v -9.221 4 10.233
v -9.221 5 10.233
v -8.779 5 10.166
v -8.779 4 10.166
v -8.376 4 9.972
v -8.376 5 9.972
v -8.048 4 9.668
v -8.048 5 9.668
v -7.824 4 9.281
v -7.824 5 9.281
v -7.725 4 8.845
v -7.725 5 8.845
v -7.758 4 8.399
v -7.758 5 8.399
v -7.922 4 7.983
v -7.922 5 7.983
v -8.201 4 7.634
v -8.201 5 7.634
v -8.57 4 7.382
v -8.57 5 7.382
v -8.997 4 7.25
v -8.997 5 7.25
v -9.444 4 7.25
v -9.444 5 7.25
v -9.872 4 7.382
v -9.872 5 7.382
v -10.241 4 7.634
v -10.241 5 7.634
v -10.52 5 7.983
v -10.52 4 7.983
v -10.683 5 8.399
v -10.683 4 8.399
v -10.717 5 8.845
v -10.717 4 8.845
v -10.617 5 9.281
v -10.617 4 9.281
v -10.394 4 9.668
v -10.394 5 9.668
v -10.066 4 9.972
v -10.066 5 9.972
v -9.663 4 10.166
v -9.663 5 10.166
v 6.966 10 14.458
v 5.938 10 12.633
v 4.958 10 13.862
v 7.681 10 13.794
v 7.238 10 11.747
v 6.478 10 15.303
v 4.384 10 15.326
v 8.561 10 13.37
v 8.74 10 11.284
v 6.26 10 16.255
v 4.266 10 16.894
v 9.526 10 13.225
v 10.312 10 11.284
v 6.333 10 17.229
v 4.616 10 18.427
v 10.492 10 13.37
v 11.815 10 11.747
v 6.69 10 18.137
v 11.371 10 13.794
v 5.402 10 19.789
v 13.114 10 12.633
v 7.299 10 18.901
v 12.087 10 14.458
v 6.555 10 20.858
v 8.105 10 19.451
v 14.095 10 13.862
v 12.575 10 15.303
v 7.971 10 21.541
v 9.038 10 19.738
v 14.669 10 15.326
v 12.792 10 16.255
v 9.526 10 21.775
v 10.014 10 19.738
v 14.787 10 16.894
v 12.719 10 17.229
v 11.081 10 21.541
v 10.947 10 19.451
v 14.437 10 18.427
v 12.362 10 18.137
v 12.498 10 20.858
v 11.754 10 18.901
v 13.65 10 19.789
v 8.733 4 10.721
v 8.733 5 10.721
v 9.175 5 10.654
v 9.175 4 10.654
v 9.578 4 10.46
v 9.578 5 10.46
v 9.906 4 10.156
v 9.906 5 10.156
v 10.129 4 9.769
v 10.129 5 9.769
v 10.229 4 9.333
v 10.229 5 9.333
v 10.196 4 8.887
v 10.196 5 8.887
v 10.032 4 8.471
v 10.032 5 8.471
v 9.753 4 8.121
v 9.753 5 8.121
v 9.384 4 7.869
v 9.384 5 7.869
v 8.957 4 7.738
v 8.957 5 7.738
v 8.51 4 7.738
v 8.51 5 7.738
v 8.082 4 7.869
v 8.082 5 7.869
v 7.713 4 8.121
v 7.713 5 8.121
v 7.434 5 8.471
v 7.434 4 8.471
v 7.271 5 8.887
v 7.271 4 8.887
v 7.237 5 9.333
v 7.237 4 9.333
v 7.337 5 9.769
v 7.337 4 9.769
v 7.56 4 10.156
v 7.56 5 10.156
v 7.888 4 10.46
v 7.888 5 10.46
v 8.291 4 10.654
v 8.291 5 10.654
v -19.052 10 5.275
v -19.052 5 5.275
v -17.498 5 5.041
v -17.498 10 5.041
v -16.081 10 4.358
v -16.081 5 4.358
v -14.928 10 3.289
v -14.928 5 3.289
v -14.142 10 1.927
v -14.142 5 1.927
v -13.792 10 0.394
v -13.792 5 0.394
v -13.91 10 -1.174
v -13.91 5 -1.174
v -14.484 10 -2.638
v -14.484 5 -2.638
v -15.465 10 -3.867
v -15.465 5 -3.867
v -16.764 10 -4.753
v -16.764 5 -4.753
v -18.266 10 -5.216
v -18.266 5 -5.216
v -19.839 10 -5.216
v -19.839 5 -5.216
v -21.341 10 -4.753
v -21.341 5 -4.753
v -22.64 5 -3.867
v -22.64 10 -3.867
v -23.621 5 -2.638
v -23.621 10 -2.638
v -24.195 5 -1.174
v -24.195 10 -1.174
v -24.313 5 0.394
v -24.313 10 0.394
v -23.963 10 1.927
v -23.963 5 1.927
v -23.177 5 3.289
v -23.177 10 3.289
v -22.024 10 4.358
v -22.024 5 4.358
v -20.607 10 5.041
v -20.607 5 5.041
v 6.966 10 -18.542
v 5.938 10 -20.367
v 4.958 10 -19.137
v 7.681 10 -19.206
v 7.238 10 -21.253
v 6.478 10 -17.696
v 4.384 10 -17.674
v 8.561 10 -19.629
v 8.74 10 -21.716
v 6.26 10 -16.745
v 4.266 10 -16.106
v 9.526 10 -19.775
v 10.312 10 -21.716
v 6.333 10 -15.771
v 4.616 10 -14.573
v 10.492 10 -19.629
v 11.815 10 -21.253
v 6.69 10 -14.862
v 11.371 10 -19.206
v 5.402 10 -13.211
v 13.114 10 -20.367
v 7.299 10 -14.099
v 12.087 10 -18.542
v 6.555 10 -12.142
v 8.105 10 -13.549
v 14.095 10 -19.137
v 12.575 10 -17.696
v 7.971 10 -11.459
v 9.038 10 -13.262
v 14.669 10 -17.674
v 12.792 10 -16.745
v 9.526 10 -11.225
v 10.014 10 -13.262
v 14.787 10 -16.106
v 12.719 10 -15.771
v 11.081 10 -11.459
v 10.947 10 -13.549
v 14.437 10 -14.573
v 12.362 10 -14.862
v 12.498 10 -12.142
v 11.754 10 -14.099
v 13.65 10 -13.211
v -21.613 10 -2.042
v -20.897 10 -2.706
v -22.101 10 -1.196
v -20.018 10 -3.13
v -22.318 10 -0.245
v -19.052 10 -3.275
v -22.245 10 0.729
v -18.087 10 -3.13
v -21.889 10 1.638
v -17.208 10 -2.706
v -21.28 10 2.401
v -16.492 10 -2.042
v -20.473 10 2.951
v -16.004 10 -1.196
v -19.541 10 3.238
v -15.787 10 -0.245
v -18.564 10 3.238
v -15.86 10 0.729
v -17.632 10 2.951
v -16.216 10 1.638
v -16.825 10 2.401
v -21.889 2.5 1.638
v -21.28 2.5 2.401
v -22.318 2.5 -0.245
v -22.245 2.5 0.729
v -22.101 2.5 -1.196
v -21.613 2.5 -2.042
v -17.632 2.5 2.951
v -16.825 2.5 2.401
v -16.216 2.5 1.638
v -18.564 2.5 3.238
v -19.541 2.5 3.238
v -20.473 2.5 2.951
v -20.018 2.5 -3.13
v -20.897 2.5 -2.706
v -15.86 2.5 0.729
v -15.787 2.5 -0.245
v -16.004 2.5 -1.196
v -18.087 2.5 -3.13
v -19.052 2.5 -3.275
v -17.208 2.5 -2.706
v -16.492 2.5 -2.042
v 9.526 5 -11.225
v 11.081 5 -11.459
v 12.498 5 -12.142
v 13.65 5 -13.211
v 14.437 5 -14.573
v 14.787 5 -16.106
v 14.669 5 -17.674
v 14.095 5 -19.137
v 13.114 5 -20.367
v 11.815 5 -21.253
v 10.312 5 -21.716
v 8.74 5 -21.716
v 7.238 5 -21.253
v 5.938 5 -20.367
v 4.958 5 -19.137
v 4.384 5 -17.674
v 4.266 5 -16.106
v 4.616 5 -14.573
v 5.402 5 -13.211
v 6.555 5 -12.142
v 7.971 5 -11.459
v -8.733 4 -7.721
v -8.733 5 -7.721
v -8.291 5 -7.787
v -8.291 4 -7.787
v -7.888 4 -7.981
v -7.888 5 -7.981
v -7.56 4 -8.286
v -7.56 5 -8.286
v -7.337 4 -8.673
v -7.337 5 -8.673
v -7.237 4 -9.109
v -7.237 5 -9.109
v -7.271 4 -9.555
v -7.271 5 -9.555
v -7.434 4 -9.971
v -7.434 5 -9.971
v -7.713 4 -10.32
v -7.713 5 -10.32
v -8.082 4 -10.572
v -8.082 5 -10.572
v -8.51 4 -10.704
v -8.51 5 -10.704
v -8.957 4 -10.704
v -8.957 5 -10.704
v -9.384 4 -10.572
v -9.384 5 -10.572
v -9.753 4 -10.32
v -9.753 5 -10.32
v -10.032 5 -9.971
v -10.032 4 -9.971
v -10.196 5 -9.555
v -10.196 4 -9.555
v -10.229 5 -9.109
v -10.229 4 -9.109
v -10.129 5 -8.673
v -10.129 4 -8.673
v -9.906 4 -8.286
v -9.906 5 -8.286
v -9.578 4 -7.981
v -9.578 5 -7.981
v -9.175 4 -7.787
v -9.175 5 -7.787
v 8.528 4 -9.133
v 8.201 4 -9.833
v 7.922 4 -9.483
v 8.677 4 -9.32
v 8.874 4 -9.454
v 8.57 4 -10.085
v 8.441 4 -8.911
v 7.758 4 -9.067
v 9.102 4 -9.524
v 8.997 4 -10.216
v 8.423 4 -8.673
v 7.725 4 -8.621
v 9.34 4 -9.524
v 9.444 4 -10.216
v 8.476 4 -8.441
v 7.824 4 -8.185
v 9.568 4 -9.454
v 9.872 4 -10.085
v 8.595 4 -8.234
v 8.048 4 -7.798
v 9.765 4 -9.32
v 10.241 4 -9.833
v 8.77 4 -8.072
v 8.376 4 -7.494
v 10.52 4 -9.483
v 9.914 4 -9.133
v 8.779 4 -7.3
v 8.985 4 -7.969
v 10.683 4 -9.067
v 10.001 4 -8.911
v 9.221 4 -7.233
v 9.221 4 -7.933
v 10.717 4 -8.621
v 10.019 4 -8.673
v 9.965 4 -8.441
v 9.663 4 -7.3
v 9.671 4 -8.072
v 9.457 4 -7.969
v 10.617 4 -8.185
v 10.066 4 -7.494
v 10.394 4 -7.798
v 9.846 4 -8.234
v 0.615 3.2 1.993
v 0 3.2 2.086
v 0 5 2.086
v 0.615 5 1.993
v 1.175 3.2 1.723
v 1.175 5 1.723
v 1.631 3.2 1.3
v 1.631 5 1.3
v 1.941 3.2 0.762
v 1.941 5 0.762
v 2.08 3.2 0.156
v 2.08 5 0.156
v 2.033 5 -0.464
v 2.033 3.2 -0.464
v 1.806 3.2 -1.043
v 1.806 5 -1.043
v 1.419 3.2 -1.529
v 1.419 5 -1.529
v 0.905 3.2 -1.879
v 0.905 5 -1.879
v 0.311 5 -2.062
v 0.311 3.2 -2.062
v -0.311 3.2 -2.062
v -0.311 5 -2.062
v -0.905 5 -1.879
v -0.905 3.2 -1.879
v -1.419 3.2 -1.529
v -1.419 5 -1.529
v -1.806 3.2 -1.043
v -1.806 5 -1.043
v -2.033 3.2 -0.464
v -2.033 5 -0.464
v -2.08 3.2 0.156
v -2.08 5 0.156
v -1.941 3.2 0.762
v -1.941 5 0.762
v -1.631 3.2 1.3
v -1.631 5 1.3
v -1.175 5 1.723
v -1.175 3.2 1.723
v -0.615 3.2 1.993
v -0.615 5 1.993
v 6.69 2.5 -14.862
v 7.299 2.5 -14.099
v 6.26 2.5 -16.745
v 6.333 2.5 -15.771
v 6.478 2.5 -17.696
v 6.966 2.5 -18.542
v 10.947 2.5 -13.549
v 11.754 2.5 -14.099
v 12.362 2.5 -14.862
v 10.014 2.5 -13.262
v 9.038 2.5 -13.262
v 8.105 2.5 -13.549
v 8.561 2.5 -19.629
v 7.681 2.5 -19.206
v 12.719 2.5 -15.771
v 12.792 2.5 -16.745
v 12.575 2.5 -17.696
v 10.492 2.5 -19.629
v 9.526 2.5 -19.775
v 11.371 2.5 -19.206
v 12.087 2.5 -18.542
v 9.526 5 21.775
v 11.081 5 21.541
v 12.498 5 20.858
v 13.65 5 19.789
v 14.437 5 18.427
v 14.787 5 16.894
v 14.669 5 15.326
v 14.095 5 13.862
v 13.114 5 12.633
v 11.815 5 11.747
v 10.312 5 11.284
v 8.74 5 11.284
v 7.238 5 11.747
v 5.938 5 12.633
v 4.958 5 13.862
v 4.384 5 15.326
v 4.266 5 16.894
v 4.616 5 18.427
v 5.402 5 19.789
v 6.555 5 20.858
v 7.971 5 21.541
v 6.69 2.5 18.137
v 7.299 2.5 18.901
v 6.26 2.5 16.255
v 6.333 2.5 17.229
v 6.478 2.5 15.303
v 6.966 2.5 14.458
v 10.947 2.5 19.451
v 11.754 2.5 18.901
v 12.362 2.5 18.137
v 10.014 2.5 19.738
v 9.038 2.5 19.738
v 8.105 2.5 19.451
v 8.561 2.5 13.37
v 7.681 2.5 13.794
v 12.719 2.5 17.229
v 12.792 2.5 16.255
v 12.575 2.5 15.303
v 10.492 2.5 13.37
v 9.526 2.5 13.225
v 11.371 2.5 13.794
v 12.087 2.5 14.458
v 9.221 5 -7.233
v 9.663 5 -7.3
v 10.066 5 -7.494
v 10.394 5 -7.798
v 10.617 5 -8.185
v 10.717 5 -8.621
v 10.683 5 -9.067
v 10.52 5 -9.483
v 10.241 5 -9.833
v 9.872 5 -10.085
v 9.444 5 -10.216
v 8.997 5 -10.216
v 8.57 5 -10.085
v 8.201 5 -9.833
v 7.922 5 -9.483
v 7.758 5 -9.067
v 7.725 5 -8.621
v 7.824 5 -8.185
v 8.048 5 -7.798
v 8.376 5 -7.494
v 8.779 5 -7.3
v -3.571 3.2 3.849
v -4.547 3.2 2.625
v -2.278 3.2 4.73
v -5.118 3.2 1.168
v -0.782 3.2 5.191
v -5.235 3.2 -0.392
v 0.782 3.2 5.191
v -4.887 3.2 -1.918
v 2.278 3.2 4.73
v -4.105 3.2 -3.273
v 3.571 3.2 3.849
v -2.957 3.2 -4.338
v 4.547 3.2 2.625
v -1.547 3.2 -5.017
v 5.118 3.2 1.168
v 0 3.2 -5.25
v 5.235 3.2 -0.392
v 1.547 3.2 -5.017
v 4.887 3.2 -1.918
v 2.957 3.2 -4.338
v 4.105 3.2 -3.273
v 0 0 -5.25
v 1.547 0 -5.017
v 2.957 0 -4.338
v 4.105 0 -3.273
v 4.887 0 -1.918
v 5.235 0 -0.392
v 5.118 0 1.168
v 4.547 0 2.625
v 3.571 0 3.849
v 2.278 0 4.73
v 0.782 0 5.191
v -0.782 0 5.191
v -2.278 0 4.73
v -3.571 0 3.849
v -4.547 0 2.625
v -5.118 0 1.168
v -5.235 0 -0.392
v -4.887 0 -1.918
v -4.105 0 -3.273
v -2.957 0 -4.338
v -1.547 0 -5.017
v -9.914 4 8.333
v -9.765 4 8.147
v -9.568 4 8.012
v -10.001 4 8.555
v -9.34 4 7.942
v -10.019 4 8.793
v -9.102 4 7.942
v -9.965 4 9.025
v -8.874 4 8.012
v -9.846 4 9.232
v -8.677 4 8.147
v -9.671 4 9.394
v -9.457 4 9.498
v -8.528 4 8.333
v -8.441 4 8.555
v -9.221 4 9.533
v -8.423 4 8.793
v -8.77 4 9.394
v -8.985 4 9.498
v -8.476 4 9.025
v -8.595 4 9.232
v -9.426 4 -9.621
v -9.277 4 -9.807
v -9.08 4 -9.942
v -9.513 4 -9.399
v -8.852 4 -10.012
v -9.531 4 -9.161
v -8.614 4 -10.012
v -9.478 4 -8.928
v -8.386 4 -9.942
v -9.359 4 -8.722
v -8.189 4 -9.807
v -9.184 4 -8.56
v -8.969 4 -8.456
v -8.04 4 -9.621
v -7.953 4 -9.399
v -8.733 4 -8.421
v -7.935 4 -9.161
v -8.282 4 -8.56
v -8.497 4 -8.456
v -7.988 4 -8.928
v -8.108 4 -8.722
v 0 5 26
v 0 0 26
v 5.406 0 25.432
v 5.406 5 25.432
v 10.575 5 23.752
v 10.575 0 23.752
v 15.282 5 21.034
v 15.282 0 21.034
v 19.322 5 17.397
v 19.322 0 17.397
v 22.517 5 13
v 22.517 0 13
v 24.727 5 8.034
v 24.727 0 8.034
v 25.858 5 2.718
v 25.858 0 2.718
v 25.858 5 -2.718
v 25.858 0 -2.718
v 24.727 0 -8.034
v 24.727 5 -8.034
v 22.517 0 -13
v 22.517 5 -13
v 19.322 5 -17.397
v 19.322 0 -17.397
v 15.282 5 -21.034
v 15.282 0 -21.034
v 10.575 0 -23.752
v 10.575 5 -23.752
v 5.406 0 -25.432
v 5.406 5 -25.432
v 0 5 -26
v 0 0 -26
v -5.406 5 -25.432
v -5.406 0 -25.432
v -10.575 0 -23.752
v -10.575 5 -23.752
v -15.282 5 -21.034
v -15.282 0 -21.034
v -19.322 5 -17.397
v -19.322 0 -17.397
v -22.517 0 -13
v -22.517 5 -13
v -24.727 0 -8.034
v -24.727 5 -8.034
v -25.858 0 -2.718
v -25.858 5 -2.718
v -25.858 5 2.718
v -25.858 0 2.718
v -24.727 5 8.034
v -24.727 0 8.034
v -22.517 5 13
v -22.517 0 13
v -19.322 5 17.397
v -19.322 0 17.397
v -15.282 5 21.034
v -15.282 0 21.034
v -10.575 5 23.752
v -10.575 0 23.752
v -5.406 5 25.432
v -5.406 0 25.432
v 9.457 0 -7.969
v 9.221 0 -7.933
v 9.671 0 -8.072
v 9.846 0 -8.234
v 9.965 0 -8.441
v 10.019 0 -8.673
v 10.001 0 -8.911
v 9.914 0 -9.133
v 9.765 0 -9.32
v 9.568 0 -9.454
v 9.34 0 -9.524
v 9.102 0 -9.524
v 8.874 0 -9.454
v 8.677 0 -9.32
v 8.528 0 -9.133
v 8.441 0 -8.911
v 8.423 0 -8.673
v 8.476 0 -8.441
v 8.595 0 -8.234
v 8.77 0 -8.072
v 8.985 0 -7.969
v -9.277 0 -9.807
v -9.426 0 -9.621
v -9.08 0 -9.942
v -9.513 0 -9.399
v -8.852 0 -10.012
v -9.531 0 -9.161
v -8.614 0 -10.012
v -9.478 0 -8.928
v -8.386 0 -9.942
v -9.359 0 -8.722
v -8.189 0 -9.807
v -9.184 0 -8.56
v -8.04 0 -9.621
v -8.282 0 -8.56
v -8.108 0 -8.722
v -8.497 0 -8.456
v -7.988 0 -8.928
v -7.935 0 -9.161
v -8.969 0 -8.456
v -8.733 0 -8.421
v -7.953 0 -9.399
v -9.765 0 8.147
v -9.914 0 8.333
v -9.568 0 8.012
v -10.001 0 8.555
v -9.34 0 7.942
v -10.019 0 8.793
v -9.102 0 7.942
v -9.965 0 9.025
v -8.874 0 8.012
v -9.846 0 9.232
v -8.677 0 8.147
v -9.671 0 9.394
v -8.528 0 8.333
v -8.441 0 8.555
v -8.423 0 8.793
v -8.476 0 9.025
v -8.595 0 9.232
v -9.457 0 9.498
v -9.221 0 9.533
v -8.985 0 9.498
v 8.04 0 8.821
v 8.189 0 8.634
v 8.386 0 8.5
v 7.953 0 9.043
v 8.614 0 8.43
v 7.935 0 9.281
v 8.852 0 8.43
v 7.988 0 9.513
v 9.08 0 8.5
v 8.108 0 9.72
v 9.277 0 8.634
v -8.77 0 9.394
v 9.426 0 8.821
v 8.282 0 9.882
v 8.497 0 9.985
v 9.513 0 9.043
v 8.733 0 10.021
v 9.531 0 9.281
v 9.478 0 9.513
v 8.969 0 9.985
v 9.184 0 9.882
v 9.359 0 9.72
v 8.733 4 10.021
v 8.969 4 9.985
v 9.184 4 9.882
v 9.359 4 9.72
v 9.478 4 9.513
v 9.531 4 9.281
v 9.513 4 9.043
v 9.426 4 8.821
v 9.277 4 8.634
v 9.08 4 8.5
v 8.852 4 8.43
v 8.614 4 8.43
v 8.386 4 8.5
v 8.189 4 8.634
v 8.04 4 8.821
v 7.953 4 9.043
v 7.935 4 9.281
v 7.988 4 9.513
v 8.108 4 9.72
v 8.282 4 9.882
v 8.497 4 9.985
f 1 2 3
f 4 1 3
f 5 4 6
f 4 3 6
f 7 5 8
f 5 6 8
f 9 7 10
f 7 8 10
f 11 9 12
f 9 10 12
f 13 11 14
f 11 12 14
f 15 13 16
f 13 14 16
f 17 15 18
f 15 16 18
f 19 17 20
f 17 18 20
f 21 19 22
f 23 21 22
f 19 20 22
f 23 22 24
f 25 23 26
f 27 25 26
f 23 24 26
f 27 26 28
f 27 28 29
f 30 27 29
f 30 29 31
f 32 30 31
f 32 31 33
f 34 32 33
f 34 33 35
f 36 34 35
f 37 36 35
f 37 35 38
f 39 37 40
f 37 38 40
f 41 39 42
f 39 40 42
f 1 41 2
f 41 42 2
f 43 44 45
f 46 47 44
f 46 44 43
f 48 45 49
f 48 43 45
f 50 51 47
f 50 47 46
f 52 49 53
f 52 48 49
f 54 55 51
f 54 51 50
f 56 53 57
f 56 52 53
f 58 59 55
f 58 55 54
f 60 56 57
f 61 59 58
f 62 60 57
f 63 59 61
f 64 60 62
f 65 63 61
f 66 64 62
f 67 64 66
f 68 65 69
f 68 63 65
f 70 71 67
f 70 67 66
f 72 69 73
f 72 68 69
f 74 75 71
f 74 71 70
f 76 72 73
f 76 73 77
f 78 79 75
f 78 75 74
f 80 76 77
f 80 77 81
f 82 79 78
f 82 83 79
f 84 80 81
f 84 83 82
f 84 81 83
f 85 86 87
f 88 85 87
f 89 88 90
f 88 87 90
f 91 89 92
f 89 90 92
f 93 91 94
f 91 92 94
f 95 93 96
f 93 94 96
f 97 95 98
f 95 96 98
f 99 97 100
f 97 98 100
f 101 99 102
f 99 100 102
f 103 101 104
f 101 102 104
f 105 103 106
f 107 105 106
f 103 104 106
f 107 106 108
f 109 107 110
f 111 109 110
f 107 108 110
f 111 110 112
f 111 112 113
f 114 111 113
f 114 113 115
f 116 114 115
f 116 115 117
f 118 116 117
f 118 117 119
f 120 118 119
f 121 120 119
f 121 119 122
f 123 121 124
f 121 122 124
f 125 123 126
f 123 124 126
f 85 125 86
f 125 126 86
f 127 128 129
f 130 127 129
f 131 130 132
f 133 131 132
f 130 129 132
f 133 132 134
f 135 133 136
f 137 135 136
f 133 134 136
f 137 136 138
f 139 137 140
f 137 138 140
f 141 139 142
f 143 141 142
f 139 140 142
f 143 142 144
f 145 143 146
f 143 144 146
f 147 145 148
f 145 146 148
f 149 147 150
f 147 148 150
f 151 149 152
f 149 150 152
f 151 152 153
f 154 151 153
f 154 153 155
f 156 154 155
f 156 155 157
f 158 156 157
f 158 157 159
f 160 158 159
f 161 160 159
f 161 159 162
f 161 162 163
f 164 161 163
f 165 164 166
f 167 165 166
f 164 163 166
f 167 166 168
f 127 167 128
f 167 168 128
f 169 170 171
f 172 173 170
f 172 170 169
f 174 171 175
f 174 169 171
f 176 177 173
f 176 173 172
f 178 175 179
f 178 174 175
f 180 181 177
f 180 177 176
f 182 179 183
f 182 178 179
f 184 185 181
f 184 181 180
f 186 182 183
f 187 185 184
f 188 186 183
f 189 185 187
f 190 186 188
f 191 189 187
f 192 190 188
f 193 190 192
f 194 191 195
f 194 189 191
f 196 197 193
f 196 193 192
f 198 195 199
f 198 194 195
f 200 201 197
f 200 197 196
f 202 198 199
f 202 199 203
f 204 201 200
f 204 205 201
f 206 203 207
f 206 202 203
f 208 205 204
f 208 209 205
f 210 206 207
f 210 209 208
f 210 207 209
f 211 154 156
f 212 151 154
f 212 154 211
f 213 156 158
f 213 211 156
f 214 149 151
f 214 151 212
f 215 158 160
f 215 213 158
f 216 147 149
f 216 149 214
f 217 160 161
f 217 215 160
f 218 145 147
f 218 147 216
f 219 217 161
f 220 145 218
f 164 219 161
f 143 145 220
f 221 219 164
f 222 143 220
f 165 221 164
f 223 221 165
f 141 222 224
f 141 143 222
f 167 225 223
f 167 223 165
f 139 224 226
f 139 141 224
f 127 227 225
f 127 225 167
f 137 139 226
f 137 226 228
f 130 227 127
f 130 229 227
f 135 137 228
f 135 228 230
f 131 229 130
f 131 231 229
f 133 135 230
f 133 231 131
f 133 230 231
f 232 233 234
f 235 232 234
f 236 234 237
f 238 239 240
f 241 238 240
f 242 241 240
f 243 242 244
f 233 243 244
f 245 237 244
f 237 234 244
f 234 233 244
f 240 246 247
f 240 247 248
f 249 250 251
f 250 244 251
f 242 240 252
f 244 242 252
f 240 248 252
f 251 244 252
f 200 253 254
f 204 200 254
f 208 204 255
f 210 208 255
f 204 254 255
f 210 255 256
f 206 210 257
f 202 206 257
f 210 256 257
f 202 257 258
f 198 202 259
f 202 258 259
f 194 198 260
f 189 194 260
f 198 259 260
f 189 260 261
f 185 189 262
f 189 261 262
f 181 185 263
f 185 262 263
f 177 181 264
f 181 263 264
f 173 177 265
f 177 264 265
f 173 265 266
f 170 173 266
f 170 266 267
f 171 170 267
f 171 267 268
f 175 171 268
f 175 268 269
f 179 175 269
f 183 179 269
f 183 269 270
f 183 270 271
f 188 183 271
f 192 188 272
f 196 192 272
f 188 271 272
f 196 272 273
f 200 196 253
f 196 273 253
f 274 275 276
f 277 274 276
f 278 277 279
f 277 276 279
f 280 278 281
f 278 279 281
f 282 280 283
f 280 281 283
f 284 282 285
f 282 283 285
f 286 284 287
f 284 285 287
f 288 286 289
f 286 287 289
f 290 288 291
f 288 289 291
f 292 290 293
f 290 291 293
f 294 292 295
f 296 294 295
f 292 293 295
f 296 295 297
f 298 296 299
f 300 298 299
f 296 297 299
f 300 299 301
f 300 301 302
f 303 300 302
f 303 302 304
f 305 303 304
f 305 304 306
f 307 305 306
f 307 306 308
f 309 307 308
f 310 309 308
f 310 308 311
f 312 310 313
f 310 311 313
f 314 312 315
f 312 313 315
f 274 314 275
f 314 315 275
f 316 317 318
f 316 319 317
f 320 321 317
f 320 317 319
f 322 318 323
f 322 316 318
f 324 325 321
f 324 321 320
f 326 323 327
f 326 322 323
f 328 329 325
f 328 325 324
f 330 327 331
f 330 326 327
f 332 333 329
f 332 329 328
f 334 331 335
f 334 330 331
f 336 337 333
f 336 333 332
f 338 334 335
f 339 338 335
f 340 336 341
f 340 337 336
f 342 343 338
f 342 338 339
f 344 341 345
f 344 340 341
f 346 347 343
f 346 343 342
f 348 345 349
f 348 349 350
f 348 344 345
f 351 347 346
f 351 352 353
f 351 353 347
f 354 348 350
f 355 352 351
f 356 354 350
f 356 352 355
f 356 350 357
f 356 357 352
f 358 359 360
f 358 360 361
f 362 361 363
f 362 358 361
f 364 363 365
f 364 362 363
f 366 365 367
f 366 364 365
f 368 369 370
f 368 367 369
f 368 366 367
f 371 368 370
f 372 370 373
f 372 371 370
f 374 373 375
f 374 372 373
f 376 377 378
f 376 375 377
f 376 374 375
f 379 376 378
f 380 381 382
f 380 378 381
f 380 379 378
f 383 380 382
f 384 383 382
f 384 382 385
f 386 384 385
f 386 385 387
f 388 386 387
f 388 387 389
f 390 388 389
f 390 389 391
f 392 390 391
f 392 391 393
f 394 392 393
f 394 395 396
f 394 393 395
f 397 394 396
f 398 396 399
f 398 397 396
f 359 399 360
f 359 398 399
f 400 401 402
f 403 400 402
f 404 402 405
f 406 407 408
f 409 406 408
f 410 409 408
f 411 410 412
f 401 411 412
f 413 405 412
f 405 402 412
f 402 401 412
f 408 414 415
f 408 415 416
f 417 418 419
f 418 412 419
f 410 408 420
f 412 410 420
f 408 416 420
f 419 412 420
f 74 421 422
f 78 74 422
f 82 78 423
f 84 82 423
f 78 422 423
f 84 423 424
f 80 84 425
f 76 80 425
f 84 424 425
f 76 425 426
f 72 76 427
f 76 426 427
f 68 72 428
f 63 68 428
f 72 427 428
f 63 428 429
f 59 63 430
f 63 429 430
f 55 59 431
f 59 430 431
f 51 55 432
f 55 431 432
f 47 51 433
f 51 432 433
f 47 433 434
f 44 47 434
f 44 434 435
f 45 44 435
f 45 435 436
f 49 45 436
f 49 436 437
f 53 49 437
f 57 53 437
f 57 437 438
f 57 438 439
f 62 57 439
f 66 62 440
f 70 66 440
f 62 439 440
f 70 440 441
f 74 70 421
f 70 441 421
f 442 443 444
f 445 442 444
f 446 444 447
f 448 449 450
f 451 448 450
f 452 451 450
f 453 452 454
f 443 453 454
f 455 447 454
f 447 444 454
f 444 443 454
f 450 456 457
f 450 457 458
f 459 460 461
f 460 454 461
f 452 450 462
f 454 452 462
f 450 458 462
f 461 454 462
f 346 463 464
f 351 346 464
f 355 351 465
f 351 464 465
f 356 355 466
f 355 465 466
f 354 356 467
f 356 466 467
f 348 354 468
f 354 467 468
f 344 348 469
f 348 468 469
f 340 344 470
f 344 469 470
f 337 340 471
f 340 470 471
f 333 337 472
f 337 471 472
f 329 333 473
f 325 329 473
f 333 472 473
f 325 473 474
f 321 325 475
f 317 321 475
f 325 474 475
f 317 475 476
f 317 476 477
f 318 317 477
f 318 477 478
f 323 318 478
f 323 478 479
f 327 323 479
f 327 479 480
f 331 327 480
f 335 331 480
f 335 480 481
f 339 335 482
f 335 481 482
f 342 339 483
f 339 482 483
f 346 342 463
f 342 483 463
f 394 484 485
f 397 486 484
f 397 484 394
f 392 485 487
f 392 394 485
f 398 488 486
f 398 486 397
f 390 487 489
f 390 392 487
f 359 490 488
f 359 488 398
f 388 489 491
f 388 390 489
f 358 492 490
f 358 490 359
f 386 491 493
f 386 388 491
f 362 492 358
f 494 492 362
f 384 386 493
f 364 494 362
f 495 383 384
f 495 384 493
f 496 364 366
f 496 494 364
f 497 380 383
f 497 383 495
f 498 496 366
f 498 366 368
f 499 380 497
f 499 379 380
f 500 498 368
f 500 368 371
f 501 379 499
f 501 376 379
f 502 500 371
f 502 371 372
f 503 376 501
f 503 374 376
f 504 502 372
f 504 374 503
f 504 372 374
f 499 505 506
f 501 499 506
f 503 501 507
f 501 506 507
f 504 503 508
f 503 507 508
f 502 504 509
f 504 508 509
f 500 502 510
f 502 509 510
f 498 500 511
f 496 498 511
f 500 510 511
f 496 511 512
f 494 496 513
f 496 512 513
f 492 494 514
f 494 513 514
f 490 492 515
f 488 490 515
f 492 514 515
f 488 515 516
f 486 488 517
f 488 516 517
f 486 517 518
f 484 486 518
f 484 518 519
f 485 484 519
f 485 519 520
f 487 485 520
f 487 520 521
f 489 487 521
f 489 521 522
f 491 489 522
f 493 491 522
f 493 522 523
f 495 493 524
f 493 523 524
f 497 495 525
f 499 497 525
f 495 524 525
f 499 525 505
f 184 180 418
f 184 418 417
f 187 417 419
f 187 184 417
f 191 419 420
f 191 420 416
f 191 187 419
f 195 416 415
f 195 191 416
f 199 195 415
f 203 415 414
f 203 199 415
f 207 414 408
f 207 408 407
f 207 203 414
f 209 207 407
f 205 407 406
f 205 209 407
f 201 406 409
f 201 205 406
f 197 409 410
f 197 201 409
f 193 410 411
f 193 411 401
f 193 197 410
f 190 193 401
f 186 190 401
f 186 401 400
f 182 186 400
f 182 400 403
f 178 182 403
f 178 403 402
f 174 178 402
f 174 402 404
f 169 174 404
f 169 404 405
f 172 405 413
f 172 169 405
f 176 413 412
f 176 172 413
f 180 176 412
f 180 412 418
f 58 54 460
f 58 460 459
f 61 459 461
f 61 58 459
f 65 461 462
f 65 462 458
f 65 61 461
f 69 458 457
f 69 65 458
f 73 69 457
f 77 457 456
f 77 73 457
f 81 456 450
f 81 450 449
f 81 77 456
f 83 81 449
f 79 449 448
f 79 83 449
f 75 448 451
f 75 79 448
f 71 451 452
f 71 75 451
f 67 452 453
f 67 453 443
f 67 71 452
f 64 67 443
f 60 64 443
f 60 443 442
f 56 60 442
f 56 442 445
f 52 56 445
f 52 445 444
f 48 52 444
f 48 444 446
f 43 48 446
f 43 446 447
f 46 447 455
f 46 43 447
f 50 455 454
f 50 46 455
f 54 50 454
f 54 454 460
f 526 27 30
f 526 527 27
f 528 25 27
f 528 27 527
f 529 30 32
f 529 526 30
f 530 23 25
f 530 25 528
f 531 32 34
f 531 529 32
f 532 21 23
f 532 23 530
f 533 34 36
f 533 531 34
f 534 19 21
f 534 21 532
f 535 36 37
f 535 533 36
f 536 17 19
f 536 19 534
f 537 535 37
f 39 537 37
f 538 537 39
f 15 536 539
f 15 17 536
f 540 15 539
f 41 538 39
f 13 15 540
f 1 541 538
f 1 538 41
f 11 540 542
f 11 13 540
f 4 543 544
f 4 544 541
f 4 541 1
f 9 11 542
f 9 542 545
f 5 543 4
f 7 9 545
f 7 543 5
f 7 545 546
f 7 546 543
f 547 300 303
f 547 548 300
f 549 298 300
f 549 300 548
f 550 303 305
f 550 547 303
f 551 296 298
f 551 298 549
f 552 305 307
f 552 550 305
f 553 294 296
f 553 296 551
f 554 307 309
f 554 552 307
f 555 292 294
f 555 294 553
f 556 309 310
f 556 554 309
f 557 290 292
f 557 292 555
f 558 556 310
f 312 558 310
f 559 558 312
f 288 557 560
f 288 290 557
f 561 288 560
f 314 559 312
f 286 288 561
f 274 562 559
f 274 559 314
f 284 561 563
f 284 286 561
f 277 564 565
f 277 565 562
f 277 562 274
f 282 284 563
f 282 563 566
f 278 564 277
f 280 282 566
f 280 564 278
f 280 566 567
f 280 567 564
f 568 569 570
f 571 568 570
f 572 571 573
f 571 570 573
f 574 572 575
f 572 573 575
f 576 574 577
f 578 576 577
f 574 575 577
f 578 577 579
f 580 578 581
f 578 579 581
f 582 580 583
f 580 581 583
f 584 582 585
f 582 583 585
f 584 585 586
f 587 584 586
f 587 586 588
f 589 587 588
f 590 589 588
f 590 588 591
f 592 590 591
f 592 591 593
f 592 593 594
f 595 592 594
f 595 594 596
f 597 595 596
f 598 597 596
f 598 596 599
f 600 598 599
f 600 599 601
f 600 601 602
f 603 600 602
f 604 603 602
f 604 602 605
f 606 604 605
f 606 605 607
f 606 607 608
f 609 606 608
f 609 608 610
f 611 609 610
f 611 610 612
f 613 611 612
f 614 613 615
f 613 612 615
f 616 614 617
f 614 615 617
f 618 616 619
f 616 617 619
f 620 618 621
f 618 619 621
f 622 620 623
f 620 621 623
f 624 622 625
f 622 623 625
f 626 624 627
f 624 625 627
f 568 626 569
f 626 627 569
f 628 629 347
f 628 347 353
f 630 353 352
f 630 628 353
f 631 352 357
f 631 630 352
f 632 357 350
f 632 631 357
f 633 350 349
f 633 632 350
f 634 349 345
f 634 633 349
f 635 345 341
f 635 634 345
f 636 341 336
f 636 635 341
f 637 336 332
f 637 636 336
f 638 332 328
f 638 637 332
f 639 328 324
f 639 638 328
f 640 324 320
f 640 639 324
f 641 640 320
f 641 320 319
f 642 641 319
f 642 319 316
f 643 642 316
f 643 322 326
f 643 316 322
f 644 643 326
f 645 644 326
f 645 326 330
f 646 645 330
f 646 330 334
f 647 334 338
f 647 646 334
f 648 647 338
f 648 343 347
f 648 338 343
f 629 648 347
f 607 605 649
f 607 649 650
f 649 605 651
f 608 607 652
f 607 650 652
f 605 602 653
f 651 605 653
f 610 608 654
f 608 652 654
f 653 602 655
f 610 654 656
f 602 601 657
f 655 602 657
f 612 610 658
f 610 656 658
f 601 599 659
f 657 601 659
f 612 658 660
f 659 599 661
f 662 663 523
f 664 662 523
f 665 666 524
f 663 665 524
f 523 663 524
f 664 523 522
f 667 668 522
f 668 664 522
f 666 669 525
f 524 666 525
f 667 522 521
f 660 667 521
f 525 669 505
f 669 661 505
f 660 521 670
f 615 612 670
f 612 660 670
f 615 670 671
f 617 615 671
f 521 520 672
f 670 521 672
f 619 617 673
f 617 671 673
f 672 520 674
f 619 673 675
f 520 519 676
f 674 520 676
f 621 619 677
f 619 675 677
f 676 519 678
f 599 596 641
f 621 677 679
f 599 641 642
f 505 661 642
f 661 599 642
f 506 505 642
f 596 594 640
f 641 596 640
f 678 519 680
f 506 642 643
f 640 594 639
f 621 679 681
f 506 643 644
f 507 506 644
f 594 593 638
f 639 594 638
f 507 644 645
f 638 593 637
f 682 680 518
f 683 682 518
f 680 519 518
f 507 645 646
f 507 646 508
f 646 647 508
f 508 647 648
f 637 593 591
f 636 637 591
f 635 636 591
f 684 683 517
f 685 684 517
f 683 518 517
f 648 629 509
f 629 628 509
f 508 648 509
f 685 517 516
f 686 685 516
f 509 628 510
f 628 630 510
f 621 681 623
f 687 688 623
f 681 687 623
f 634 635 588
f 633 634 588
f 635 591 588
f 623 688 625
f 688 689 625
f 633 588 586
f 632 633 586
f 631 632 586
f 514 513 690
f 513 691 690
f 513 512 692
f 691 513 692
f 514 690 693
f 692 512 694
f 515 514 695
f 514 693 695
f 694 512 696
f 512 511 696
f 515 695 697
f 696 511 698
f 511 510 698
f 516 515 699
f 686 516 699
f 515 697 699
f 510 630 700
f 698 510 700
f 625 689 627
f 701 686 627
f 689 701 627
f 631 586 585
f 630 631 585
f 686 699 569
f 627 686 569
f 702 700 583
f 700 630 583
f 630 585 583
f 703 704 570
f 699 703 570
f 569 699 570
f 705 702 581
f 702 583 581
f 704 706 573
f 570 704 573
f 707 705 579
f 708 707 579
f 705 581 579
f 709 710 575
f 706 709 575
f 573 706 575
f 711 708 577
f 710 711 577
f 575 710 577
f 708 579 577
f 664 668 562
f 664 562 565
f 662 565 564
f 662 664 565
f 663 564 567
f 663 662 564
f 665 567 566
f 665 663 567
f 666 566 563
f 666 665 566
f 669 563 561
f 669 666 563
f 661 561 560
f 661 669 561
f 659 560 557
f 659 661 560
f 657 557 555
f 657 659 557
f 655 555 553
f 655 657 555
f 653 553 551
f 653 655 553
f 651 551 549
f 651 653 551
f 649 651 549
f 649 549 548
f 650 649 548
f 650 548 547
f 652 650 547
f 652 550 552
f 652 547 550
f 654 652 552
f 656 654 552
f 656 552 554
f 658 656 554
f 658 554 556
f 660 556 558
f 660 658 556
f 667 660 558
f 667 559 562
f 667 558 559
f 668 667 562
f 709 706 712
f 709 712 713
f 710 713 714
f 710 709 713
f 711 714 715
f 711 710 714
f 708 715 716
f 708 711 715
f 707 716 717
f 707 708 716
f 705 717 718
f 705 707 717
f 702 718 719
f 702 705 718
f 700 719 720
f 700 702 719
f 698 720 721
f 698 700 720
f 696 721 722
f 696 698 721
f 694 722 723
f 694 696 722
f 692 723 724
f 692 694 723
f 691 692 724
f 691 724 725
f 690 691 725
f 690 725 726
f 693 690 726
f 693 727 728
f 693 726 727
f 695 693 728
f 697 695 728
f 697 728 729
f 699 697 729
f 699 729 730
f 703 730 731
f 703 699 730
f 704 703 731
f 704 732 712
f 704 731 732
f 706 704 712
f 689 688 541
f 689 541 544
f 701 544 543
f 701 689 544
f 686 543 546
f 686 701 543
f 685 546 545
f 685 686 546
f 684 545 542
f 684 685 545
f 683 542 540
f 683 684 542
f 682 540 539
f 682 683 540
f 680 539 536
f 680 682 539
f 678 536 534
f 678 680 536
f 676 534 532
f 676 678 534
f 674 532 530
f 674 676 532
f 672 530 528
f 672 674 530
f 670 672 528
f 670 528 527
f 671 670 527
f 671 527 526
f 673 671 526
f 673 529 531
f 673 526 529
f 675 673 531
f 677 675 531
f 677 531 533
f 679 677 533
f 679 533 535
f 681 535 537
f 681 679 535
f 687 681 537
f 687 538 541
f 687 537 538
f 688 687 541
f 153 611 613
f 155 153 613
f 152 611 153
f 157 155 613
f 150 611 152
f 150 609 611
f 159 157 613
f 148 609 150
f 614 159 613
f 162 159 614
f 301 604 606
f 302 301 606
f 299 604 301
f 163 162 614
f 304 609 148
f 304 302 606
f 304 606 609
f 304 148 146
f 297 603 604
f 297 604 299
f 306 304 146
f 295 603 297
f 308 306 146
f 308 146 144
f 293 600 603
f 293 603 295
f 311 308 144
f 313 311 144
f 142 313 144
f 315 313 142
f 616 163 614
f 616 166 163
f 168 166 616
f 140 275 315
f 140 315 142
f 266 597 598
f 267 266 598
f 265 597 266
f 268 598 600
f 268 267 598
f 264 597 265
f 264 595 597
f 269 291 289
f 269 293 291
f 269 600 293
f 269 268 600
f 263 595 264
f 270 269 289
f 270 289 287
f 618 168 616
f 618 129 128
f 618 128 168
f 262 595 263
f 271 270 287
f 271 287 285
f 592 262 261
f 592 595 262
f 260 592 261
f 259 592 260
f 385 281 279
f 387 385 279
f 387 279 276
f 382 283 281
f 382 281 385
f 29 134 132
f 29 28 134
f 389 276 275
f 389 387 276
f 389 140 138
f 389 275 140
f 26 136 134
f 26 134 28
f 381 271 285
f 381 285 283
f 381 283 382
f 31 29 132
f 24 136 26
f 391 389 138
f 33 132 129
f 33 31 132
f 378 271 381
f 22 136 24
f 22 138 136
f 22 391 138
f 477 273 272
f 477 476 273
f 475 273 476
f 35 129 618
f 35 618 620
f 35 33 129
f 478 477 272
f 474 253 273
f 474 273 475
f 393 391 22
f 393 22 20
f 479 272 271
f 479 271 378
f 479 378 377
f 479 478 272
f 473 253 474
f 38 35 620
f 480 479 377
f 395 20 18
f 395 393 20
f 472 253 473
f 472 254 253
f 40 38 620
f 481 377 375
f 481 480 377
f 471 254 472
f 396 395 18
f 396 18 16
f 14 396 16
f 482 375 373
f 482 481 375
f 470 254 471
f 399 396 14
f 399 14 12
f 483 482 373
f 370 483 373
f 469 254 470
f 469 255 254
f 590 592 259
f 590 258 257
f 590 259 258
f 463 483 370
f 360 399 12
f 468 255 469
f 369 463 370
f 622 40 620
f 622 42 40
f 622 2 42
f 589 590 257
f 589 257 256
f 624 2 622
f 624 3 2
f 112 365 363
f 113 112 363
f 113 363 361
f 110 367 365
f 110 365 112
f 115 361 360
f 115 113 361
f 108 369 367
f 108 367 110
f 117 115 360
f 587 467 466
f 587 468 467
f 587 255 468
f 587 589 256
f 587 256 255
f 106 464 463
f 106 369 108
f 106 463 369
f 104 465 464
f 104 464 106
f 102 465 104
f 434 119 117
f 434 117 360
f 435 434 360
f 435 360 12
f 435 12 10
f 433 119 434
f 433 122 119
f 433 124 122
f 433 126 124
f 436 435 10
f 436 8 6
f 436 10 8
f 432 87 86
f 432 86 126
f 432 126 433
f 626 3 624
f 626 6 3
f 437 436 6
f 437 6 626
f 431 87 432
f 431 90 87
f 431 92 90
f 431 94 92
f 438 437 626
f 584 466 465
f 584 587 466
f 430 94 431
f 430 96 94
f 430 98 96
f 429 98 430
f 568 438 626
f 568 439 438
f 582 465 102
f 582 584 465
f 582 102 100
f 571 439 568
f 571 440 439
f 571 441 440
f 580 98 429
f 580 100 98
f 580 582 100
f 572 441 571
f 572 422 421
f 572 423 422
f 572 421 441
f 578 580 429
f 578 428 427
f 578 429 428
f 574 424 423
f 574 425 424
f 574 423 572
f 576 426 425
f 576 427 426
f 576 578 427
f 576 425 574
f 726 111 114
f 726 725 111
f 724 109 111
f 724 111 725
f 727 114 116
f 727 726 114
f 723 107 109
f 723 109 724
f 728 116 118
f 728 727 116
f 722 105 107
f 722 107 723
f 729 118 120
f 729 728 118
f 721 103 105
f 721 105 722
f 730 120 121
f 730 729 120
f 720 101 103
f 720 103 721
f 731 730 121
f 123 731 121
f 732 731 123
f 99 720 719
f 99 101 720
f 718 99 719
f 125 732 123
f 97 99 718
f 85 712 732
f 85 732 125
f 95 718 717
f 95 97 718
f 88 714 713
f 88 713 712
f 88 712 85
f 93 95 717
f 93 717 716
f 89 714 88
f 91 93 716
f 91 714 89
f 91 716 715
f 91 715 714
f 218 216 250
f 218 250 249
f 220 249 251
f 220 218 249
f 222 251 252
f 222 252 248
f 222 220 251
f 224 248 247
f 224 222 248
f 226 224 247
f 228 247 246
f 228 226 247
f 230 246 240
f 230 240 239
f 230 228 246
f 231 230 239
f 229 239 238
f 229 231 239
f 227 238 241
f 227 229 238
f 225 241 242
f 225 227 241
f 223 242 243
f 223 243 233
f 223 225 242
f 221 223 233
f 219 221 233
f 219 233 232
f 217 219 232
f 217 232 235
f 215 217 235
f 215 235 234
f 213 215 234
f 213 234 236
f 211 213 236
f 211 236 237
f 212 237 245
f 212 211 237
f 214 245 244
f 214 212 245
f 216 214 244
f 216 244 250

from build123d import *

# Parameters (mm, degrees)
SKETCH2_R               = 26
SKETCH2_R_2             = 2.085648148
BOSS_EXTRUDE2_DEPTH     = 10
SKETCH3_R               = 3.275
CUT_EXTRUDE1_DEPTH      = 7.5
CUT_EXTRUDE2_START      = -5
SKETCH4_R               = 26
SKETCH4_R_2             = 5.275
CUT_EXTRUDE2_DEPTH      = 5
SKETCH5_R               = 5.25
CUT_EXTRUDE3_DEPTH      = 3.2
CUT_EXTRUDE4_DEPTH      = 38.107950631
CUT_EXTRUDE4_DEPTH_BACK = 38.107950631
SKETCH6_R               = 0.8
SKETCH7_R               = 1.500000048
CUT_EXTRUDE5_DEPTH      = 1


with BuildPart() as part:
    # Sketch2 → Boss-Extrude2 (new body)
    with BuildSketch(Plane(origin=(0, 0, 0), x_dir=(1, 0, 0), z_dir=(0, 1, 0))):
        with Locations(Location((0, 0, 0), (0, 0, 270))):
            Circle(SKETCH2_R)
        with Locations(Location((0, 0, 0), (0, 0, 270))):
            Circle(SKETCH2_R_2, mode=Mode.SUBTRACT)
    extrude(amount=BOSS_EXTRUDE2_DEPTH)

    # Sketch3 → Cut-Extrude1 (cut)
    with BuildSketch(Plane.XZ.offset(-10)):
        with Locations(Location((9.52625, -16.499949006, 0), (0, 0, 270))):
            Circle(SKETCH3_R)
        with Locations(Location((9.52625, 16.499949006, 0), (0, 0, 270))):
            Circle(SKETCH3_R)
        with Locations(Location((-19.0525, 0, 0), (0, 0, 270))):
            Circle(SKETCH3_R)
    extrude(amount=CUT_EXTRUDE1_DEPTH, mode=Mode.SUBTRACT)

    # Sketch4 → Cut-Extrude2 (cut)
    with BuildSketch(Plane(origin=(0, 10, 0), x_dir=(1, 0, 0), z_dir=(0, 1, 0)).offset(CUT_EXTRUDE2_START)):
        with Locations(Location((0, 0, 0), (0, 0, 270))):
            Circle(SKETCH4_R)
        with Locations(Location((-19.0525, 0, 0), (0, 0, 270))):
            Circle(SKETCH4_R_2, mode=Mode.SUBTRACT)
        with Locations(Location((9.52625, -16.499949006, 0), (0, 0, 270))):
            Circle(SKETCH4_R_2, mode=Mode.SUBTRACT)
        with Locations(Location((9.52625, 16.499949006, 0), (0, 0, 270))):
            Circle(SKETCH4_R_2, mode=Mode.SUBTRACT)
    extrude(amount=CUT_EXTRUDE2_DEPTH, mode=Mode.SUBTRACT)

    # Sketch5 → Cut-Extrude3 (cut)
    with BuildSketch(Plane.XZ):
        with Locations(Location((0, 0, 0), (0, 0, 270))):
            Circle(SKETCH5_R)
    extrude(amount=-CUT_EXTRUDE3_DEPTH, mode=Mode.SUBTRACT)

    # Sketch6 → Cut-Extrude4 (cut, two sides: drawn at the far end of the back side and taken through both)
    with BuildSketch(Plane(origin=(0, 5, 0), x_dir=(1, 0, 0), z_dir=(0, 1, 0)).offset(-CUT_EXTRUDE4_DEPTH_BACK)):
        with Locations(Location((-8.733127343, 9.220763895, 0), (0, 0, 270))):
            Circle(SKETCH6_R)
        with Locations(Location((9.220763895, 8.733127343, 0), (0, 0, 270))):
            Circle(SKETCH6_R)
        with Locations(Location((8.733127343, -9.220763895, 0), (0, 0, 270))):
            Circle(SKETCH6_R)
        with Locations(Location((-9.220763895, -8.733127343, 0), (0, 0, 270))):
            Circle(SKETCH6_R)
    extrude(amount=CUT_EXTRUDE4_DEPTH + CUT_EXTRUDE4_DEPTH_BACK, mode=Mode.SUBTRACT)

    # Sketch7 → Cut-Extrude5 (cut)
    with BuildSketch(Plane(origin=(0, 5, 0), x_dir=(1, 0, 0), z_dir=(0, 1, 0))):
        with Locations(Location((-8.733127343, 9.220763895, 0), (0, 0, 270))):
            Circle(SKETCH7_R)
        with Locations(Location((9.220763895, 8.733127343, 0), (0, 0, 270))):
            Circle(SKETCH7_R)
        with Locations(Location((8.733127343, -9.220763895, 0), (0, 0, 270))):
            Circle(SKETCH7_R)
        with Locations(Location((-9.220763895, -8.733127343, 0), (0, 0, 270))):
            Circle(SKETCH7_R)
    extrude(amount=-CUT_EXTRUDE5_DEPTH, mode=Mode.SUBTRACT)


solid = part.part
